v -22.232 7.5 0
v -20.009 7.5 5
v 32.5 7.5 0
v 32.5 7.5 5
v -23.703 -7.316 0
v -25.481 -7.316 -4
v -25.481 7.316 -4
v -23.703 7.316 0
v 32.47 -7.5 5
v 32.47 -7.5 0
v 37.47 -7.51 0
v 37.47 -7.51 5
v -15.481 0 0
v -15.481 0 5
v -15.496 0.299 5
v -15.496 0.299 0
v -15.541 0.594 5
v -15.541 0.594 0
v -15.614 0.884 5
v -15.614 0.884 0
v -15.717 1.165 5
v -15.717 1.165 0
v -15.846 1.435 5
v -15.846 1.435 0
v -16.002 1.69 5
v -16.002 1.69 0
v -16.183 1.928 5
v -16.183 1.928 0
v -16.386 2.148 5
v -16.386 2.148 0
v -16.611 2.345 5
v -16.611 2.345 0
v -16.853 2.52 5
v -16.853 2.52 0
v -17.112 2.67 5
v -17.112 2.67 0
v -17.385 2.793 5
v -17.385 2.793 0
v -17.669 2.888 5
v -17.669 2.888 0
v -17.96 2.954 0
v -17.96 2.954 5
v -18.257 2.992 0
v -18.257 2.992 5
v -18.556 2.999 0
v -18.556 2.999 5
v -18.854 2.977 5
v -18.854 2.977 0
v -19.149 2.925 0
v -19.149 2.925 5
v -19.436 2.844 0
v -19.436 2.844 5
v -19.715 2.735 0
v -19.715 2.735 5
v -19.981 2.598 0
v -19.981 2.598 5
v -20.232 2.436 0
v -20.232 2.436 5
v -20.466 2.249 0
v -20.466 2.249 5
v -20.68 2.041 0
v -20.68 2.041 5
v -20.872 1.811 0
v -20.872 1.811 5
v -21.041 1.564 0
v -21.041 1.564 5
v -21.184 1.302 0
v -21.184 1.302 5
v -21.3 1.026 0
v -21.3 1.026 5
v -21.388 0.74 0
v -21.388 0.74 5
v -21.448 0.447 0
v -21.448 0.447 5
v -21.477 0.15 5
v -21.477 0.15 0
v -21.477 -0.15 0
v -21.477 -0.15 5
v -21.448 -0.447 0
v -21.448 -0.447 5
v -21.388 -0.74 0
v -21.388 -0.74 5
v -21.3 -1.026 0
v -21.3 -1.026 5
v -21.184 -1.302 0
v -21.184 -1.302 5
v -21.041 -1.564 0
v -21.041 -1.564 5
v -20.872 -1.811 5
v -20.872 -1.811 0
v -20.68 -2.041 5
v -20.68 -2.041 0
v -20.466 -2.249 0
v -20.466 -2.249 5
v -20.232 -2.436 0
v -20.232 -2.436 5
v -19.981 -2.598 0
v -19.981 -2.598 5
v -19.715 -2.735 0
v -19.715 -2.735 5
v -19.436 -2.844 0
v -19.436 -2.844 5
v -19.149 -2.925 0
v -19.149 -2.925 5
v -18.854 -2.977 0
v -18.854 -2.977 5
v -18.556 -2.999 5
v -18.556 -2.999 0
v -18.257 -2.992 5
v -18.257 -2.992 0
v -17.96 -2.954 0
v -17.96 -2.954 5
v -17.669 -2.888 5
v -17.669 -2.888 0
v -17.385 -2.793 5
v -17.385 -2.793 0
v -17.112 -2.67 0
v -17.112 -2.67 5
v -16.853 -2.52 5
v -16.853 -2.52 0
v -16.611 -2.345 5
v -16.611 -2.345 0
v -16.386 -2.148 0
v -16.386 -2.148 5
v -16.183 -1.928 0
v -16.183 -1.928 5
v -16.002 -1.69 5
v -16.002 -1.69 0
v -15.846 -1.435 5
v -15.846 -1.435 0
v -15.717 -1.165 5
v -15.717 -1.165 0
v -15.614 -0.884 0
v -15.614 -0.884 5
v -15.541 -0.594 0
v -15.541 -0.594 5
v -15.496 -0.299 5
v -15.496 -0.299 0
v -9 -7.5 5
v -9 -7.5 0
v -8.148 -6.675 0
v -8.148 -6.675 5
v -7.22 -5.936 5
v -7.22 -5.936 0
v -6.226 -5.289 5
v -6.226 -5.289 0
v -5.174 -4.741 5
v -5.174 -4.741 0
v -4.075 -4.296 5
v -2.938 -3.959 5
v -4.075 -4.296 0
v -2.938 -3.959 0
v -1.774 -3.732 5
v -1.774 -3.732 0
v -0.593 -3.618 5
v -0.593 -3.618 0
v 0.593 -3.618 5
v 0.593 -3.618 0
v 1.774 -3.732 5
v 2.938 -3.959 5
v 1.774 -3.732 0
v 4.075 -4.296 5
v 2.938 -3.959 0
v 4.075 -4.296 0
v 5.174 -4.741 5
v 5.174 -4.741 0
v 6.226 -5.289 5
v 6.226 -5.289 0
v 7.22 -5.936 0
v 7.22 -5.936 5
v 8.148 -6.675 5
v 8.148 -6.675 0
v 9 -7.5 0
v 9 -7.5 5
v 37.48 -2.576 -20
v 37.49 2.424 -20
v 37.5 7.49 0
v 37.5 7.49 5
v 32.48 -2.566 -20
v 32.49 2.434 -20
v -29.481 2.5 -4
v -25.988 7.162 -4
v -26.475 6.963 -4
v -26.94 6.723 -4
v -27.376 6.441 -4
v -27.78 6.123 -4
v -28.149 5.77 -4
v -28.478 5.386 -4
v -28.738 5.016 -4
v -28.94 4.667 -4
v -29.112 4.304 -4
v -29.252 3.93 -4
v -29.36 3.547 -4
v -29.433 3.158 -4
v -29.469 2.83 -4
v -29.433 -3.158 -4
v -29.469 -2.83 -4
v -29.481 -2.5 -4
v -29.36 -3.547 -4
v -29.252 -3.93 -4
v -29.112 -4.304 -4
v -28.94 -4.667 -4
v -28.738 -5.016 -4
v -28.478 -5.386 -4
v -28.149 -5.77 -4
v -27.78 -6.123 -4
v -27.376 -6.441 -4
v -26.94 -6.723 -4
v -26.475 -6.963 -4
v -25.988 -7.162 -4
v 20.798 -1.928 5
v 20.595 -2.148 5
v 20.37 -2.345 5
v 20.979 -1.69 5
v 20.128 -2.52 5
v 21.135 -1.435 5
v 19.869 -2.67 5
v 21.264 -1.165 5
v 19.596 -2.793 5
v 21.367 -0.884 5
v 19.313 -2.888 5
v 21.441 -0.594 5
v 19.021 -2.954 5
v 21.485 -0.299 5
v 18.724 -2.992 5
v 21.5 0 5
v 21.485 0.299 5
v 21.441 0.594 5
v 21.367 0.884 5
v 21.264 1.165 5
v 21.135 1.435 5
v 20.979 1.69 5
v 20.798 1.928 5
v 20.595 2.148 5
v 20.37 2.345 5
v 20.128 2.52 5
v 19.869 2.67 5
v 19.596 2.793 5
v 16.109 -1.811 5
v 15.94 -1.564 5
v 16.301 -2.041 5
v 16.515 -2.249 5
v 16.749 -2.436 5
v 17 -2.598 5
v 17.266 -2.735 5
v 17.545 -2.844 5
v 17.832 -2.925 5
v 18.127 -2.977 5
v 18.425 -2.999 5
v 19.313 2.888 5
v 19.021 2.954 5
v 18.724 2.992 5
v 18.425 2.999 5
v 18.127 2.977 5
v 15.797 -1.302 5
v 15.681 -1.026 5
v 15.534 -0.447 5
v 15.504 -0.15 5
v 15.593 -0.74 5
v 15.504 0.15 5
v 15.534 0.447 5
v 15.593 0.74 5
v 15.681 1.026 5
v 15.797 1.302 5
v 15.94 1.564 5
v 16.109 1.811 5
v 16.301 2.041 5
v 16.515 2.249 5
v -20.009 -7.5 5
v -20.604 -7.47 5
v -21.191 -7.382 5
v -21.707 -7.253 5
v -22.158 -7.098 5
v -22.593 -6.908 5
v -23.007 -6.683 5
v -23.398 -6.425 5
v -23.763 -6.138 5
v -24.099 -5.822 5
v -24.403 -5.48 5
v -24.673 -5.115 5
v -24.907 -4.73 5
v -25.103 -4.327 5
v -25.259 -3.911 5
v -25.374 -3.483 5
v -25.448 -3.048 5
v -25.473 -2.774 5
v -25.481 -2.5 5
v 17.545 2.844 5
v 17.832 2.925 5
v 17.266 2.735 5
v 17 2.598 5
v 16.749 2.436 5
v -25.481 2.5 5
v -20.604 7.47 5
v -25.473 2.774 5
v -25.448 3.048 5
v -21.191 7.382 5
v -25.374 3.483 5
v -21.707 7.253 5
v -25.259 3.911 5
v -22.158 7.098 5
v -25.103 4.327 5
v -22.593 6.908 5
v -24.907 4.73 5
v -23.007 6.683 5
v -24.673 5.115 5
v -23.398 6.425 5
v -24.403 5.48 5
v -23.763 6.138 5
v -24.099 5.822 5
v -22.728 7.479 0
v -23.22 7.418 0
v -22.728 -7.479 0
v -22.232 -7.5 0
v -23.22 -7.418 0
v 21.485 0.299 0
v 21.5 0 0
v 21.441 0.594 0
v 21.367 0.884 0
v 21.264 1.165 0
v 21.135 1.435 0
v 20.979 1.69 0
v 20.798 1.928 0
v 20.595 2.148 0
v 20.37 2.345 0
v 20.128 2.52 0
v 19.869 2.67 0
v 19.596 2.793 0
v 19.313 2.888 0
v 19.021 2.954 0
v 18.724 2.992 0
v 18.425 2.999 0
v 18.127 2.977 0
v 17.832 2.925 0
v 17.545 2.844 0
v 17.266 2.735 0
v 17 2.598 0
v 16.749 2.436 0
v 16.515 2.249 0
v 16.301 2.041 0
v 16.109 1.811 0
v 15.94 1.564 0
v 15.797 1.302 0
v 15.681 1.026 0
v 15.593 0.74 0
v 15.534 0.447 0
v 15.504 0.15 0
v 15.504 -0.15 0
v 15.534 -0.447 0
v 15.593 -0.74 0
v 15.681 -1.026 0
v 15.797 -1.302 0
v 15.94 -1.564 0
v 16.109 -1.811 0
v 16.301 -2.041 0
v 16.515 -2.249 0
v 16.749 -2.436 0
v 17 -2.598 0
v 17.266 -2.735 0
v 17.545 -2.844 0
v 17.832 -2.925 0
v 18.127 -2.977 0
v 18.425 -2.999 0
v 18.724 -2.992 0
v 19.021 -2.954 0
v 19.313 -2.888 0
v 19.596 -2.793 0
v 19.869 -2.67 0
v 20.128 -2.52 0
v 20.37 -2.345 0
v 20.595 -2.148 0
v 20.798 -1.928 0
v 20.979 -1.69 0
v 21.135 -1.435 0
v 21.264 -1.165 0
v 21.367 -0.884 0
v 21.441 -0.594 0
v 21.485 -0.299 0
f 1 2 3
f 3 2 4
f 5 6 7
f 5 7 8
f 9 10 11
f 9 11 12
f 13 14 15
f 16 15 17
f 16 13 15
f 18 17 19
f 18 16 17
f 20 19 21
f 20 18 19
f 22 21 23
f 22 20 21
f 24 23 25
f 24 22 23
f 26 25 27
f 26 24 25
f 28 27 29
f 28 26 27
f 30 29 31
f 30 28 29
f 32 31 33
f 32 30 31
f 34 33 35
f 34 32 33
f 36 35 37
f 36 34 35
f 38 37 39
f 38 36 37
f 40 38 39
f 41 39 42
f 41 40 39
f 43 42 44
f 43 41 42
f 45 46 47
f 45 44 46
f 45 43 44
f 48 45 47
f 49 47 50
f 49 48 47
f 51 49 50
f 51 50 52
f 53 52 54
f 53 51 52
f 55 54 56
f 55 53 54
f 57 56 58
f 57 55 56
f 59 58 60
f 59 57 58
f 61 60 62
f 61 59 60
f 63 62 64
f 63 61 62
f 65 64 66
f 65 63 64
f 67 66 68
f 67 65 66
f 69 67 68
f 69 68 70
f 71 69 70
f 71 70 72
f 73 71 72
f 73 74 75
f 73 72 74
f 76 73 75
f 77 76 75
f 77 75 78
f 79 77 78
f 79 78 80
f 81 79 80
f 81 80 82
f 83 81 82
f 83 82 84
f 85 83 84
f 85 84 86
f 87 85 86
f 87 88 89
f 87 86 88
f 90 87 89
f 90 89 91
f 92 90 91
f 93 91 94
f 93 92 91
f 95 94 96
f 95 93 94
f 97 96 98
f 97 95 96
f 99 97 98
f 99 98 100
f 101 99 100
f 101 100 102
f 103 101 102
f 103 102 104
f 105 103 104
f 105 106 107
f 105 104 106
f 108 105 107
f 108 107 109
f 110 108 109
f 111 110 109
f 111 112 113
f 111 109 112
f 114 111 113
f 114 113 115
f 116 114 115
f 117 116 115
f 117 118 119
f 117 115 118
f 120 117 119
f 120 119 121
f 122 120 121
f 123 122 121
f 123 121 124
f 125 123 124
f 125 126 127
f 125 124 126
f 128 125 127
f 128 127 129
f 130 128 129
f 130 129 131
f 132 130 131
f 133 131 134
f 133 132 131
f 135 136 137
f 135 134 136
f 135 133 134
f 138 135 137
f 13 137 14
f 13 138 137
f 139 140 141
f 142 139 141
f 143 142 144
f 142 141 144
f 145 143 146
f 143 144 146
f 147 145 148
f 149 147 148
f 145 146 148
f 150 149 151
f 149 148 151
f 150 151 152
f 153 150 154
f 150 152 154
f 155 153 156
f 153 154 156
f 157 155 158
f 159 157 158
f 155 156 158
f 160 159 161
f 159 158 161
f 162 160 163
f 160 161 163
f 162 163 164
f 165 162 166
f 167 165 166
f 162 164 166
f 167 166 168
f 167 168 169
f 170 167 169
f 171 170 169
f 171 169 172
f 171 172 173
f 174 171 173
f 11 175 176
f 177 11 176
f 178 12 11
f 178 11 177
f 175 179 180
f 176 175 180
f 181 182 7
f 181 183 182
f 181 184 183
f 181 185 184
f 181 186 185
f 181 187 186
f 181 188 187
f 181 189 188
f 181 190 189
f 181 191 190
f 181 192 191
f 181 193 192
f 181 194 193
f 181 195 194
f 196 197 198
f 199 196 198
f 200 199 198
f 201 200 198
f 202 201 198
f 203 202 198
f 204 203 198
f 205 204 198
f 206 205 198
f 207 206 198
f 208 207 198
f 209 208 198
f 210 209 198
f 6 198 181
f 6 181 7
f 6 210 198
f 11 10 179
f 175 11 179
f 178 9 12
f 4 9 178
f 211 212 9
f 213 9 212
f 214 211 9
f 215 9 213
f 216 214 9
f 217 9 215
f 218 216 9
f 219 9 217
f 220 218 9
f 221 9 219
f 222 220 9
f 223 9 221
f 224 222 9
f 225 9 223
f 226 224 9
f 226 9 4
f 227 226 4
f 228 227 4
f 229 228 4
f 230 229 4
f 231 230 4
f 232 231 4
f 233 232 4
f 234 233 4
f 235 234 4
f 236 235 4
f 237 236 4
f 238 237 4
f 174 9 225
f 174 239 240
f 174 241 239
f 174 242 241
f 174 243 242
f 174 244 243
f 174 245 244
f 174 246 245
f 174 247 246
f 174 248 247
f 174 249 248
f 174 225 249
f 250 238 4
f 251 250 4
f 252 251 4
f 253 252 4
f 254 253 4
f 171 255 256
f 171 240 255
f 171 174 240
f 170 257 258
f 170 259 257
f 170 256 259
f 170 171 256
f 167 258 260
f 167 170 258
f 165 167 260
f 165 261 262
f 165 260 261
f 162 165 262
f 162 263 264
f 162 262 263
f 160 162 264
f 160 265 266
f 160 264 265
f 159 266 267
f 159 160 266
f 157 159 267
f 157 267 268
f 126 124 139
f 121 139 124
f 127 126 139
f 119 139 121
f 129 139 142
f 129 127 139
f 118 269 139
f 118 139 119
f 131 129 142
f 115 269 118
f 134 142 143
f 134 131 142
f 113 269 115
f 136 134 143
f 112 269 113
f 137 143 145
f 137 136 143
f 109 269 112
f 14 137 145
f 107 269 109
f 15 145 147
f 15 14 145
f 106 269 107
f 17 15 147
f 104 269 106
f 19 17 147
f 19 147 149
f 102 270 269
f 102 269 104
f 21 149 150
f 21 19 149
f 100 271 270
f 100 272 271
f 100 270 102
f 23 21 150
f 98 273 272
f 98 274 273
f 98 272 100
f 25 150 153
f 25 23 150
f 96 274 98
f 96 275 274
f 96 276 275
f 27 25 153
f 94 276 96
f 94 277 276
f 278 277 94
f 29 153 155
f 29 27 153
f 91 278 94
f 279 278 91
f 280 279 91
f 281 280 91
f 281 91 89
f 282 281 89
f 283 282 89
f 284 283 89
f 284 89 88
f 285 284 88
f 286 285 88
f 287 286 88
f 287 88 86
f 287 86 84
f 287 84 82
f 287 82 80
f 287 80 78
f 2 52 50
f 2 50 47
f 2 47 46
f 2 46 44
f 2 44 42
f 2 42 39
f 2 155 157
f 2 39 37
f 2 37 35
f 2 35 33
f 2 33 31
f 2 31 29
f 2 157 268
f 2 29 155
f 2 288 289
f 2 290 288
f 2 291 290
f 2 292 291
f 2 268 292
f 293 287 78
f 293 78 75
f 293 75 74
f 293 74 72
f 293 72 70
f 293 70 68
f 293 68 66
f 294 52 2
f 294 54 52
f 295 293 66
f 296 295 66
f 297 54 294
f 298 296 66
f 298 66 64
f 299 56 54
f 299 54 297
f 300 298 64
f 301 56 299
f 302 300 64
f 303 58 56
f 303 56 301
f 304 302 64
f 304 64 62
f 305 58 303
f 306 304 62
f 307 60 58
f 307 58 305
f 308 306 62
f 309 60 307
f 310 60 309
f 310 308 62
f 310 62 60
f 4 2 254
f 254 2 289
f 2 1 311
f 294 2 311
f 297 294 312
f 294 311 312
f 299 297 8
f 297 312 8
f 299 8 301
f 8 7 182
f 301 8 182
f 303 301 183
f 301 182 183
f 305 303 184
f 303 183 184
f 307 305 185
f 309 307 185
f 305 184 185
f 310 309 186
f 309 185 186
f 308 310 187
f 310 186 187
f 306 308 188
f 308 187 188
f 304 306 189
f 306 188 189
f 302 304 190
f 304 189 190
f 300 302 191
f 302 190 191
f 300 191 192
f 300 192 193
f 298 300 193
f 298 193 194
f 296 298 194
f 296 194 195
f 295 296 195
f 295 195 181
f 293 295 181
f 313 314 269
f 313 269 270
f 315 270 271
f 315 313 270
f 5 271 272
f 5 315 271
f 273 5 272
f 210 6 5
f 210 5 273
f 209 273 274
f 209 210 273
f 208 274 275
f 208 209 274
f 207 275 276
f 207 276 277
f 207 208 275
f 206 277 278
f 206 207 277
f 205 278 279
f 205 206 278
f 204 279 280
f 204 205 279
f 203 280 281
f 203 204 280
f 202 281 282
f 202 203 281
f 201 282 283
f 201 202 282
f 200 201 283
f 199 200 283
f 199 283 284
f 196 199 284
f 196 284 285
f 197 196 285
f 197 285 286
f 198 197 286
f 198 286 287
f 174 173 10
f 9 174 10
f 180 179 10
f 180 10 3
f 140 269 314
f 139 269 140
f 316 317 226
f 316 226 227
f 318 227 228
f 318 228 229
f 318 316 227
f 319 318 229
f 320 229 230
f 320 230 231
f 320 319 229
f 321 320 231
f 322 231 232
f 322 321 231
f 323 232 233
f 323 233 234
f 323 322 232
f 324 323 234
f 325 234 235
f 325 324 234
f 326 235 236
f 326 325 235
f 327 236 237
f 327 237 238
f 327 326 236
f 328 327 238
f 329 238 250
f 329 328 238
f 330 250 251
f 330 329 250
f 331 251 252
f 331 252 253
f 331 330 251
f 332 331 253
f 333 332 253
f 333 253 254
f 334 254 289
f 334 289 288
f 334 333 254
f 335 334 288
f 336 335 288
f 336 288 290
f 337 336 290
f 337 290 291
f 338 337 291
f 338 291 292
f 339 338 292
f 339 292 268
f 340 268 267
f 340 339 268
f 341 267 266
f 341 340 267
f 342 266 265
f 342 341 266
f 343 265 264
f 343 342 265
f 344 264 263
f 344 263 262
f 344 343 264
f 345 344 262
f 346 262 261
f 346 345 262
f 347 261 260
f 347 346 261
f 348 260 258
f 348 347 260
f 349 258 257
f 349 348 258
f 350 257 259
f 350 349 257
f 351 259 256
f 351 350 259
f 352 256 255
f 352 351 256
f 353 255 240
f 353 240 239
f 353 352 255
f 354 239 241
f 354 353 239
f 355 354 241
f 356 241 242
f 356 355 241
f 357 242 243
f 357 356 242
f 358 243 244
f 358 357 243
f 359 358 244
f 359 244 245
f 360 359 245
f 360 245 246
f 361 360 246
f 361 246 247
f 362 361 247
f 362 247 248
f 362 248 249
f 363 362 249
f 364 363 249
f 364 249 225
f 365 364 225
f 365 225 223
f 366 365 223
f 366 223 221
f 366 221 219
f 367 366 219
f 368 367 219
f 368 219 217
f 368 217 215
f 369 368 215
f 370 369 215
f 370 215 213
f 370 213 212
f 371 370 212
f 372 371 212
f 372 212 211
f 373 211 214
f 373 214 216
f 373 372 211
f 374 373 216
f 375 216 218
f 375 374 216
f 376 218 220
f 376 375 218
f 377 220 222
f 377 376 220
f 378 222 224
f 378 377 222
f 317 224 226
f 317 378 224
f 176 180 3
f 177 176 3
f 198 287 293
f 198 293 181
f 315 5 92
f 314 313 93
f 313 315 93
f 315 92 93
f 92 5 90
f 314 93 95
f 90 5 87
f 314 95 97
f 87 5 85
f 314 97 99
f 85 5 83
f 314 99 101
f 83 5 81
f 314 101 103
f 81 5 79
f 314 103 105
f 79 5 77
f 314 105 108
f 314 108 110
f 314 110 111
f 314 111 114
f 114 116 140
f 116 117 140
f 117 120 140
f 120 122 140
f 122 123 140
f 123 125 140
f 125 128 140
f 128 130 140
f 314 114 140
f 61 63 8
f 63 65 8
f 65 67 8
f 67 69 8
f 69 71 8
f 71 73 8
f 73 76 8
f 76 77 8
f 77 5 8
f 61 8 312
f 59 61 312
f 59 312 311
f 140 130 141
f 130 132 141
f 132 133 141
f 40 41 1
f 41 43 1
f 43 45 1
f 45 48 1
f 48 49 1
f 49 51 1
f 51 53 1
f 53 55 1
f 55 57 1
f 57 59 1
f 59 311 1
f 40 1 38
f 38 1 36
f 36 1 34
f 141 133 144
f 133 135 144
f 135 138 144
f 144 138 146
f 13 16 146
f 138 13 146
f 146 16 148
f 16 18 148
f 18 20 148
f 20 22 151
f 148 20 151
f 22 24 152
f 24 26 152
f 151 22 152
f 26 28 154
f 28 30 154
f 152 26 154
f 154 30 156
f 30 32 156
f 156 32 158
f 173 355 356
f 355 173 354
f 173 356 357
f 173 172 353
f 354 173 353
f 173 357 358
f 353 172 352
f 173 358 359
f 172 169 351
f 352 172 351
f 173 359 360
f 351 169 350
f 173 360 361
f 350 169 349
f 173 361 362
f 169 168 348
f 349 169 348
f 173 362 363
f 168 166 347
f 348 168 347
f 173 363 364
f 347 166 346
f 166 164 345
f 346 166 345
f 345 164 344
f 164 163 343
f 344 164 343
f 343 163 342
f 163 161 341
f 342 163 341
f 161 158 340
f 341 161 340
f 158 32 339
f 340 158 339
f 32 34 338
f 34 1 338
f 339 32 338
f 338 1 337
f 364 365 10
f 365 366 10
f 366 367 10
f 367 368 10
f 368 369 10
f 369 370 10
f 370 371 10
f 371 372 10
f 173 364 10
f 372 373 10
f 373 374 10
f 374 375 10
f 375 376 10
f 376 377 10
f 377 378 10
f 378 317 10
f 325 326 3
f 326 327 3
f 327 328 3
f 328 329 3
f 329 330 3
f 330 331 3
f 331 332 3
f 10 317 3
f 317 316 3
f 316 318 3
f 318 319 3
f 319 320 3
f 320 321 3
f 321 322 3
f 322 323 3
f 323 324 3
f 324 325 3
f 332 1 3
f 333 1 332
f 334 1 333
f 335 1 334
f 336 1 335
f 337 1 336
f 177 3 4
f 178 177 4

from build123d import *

# Parameters (mm, degrees)
F0_R     = 3
F1_DEPTH = 5
F2_W     = 15.0000307818
F2_H     = 5
F3_DEPTH = 5
F5_DEPTH = 15
F6_R     = 5


with BuildPart() as f1:
    # F0 (on Top) → F1 (new body)
    with BuildSketch(Plane.XY):
        with BuildLine():
            Line((32.4696116149, -7.5), (32.5, 7.5))
            Line((32.5, 7.5), (-25.481024757, 7.5))
            Line((-25.481024757, 7.5), (-25.481024757, 0))
            Line((-25.481024757, 0), (-25.481024757, -7.5))
            Line((-25.481024757, -7.5), (-9, -7.5))
            ThreePointArc((-9, -7.5), (0, -3.6042395476), (9, -7.5))
            Line((9, -7.5), (32.4696116149, -7.5))
        make_face()
        with Locations((-18.481024757, 0)):
            Circle(F0_R, mode=Mode.SUBTRACT)
        with Locations((18.5, 0)):
            Circle(F0_R, mode=Mode.SUBTRACT)
    extrude(amount=F1_DEPTH)

    # F2 (on face) → F3 (join)
    with BuildSketch(Plane(origin=(32.4846724826, -0.0658104491, 0), x_dir=(0.0020258882, 0.9999979479, 0), z_dir=(0.9999979479, -0.0020258882, 0))):
        Polygon((7.565825975, 0), (-7.4342048068, 0), (-2.5, -20), (2.5, -20), align=None)
        with Locations((0.0658105841, 2.5)):
            Rectangle(F2_W, F2_H)
    extrude(amount=F3_DEPTH)

    # F4 (on face) → F5 (join)
    with BuildSketch(Plane.XZ.offset(7.5)):
        Polygon((-29.481024757, -4), (-25.481024757, -4), (-23.7032469792, 0), (-25.481024757, 0), (-25.481024757, 5), align=None)
        Polygon((-25.481024757, 0), (-23.7032469792, 0), (-21.481024757, 5), (-25.481024757, 5), align=None)
    extrude(amount=-F5_DEPTH)

    # F6
    f6_edges = [f1.edges().sort_by_distance(p)[0] for p in [
        (-27.481025, -7.5, 0.5),
        (-27.481025, 7.5, 0.5),
    ]]
    fillet(f6_edges, radius=F6_R)


solid = f1.part
